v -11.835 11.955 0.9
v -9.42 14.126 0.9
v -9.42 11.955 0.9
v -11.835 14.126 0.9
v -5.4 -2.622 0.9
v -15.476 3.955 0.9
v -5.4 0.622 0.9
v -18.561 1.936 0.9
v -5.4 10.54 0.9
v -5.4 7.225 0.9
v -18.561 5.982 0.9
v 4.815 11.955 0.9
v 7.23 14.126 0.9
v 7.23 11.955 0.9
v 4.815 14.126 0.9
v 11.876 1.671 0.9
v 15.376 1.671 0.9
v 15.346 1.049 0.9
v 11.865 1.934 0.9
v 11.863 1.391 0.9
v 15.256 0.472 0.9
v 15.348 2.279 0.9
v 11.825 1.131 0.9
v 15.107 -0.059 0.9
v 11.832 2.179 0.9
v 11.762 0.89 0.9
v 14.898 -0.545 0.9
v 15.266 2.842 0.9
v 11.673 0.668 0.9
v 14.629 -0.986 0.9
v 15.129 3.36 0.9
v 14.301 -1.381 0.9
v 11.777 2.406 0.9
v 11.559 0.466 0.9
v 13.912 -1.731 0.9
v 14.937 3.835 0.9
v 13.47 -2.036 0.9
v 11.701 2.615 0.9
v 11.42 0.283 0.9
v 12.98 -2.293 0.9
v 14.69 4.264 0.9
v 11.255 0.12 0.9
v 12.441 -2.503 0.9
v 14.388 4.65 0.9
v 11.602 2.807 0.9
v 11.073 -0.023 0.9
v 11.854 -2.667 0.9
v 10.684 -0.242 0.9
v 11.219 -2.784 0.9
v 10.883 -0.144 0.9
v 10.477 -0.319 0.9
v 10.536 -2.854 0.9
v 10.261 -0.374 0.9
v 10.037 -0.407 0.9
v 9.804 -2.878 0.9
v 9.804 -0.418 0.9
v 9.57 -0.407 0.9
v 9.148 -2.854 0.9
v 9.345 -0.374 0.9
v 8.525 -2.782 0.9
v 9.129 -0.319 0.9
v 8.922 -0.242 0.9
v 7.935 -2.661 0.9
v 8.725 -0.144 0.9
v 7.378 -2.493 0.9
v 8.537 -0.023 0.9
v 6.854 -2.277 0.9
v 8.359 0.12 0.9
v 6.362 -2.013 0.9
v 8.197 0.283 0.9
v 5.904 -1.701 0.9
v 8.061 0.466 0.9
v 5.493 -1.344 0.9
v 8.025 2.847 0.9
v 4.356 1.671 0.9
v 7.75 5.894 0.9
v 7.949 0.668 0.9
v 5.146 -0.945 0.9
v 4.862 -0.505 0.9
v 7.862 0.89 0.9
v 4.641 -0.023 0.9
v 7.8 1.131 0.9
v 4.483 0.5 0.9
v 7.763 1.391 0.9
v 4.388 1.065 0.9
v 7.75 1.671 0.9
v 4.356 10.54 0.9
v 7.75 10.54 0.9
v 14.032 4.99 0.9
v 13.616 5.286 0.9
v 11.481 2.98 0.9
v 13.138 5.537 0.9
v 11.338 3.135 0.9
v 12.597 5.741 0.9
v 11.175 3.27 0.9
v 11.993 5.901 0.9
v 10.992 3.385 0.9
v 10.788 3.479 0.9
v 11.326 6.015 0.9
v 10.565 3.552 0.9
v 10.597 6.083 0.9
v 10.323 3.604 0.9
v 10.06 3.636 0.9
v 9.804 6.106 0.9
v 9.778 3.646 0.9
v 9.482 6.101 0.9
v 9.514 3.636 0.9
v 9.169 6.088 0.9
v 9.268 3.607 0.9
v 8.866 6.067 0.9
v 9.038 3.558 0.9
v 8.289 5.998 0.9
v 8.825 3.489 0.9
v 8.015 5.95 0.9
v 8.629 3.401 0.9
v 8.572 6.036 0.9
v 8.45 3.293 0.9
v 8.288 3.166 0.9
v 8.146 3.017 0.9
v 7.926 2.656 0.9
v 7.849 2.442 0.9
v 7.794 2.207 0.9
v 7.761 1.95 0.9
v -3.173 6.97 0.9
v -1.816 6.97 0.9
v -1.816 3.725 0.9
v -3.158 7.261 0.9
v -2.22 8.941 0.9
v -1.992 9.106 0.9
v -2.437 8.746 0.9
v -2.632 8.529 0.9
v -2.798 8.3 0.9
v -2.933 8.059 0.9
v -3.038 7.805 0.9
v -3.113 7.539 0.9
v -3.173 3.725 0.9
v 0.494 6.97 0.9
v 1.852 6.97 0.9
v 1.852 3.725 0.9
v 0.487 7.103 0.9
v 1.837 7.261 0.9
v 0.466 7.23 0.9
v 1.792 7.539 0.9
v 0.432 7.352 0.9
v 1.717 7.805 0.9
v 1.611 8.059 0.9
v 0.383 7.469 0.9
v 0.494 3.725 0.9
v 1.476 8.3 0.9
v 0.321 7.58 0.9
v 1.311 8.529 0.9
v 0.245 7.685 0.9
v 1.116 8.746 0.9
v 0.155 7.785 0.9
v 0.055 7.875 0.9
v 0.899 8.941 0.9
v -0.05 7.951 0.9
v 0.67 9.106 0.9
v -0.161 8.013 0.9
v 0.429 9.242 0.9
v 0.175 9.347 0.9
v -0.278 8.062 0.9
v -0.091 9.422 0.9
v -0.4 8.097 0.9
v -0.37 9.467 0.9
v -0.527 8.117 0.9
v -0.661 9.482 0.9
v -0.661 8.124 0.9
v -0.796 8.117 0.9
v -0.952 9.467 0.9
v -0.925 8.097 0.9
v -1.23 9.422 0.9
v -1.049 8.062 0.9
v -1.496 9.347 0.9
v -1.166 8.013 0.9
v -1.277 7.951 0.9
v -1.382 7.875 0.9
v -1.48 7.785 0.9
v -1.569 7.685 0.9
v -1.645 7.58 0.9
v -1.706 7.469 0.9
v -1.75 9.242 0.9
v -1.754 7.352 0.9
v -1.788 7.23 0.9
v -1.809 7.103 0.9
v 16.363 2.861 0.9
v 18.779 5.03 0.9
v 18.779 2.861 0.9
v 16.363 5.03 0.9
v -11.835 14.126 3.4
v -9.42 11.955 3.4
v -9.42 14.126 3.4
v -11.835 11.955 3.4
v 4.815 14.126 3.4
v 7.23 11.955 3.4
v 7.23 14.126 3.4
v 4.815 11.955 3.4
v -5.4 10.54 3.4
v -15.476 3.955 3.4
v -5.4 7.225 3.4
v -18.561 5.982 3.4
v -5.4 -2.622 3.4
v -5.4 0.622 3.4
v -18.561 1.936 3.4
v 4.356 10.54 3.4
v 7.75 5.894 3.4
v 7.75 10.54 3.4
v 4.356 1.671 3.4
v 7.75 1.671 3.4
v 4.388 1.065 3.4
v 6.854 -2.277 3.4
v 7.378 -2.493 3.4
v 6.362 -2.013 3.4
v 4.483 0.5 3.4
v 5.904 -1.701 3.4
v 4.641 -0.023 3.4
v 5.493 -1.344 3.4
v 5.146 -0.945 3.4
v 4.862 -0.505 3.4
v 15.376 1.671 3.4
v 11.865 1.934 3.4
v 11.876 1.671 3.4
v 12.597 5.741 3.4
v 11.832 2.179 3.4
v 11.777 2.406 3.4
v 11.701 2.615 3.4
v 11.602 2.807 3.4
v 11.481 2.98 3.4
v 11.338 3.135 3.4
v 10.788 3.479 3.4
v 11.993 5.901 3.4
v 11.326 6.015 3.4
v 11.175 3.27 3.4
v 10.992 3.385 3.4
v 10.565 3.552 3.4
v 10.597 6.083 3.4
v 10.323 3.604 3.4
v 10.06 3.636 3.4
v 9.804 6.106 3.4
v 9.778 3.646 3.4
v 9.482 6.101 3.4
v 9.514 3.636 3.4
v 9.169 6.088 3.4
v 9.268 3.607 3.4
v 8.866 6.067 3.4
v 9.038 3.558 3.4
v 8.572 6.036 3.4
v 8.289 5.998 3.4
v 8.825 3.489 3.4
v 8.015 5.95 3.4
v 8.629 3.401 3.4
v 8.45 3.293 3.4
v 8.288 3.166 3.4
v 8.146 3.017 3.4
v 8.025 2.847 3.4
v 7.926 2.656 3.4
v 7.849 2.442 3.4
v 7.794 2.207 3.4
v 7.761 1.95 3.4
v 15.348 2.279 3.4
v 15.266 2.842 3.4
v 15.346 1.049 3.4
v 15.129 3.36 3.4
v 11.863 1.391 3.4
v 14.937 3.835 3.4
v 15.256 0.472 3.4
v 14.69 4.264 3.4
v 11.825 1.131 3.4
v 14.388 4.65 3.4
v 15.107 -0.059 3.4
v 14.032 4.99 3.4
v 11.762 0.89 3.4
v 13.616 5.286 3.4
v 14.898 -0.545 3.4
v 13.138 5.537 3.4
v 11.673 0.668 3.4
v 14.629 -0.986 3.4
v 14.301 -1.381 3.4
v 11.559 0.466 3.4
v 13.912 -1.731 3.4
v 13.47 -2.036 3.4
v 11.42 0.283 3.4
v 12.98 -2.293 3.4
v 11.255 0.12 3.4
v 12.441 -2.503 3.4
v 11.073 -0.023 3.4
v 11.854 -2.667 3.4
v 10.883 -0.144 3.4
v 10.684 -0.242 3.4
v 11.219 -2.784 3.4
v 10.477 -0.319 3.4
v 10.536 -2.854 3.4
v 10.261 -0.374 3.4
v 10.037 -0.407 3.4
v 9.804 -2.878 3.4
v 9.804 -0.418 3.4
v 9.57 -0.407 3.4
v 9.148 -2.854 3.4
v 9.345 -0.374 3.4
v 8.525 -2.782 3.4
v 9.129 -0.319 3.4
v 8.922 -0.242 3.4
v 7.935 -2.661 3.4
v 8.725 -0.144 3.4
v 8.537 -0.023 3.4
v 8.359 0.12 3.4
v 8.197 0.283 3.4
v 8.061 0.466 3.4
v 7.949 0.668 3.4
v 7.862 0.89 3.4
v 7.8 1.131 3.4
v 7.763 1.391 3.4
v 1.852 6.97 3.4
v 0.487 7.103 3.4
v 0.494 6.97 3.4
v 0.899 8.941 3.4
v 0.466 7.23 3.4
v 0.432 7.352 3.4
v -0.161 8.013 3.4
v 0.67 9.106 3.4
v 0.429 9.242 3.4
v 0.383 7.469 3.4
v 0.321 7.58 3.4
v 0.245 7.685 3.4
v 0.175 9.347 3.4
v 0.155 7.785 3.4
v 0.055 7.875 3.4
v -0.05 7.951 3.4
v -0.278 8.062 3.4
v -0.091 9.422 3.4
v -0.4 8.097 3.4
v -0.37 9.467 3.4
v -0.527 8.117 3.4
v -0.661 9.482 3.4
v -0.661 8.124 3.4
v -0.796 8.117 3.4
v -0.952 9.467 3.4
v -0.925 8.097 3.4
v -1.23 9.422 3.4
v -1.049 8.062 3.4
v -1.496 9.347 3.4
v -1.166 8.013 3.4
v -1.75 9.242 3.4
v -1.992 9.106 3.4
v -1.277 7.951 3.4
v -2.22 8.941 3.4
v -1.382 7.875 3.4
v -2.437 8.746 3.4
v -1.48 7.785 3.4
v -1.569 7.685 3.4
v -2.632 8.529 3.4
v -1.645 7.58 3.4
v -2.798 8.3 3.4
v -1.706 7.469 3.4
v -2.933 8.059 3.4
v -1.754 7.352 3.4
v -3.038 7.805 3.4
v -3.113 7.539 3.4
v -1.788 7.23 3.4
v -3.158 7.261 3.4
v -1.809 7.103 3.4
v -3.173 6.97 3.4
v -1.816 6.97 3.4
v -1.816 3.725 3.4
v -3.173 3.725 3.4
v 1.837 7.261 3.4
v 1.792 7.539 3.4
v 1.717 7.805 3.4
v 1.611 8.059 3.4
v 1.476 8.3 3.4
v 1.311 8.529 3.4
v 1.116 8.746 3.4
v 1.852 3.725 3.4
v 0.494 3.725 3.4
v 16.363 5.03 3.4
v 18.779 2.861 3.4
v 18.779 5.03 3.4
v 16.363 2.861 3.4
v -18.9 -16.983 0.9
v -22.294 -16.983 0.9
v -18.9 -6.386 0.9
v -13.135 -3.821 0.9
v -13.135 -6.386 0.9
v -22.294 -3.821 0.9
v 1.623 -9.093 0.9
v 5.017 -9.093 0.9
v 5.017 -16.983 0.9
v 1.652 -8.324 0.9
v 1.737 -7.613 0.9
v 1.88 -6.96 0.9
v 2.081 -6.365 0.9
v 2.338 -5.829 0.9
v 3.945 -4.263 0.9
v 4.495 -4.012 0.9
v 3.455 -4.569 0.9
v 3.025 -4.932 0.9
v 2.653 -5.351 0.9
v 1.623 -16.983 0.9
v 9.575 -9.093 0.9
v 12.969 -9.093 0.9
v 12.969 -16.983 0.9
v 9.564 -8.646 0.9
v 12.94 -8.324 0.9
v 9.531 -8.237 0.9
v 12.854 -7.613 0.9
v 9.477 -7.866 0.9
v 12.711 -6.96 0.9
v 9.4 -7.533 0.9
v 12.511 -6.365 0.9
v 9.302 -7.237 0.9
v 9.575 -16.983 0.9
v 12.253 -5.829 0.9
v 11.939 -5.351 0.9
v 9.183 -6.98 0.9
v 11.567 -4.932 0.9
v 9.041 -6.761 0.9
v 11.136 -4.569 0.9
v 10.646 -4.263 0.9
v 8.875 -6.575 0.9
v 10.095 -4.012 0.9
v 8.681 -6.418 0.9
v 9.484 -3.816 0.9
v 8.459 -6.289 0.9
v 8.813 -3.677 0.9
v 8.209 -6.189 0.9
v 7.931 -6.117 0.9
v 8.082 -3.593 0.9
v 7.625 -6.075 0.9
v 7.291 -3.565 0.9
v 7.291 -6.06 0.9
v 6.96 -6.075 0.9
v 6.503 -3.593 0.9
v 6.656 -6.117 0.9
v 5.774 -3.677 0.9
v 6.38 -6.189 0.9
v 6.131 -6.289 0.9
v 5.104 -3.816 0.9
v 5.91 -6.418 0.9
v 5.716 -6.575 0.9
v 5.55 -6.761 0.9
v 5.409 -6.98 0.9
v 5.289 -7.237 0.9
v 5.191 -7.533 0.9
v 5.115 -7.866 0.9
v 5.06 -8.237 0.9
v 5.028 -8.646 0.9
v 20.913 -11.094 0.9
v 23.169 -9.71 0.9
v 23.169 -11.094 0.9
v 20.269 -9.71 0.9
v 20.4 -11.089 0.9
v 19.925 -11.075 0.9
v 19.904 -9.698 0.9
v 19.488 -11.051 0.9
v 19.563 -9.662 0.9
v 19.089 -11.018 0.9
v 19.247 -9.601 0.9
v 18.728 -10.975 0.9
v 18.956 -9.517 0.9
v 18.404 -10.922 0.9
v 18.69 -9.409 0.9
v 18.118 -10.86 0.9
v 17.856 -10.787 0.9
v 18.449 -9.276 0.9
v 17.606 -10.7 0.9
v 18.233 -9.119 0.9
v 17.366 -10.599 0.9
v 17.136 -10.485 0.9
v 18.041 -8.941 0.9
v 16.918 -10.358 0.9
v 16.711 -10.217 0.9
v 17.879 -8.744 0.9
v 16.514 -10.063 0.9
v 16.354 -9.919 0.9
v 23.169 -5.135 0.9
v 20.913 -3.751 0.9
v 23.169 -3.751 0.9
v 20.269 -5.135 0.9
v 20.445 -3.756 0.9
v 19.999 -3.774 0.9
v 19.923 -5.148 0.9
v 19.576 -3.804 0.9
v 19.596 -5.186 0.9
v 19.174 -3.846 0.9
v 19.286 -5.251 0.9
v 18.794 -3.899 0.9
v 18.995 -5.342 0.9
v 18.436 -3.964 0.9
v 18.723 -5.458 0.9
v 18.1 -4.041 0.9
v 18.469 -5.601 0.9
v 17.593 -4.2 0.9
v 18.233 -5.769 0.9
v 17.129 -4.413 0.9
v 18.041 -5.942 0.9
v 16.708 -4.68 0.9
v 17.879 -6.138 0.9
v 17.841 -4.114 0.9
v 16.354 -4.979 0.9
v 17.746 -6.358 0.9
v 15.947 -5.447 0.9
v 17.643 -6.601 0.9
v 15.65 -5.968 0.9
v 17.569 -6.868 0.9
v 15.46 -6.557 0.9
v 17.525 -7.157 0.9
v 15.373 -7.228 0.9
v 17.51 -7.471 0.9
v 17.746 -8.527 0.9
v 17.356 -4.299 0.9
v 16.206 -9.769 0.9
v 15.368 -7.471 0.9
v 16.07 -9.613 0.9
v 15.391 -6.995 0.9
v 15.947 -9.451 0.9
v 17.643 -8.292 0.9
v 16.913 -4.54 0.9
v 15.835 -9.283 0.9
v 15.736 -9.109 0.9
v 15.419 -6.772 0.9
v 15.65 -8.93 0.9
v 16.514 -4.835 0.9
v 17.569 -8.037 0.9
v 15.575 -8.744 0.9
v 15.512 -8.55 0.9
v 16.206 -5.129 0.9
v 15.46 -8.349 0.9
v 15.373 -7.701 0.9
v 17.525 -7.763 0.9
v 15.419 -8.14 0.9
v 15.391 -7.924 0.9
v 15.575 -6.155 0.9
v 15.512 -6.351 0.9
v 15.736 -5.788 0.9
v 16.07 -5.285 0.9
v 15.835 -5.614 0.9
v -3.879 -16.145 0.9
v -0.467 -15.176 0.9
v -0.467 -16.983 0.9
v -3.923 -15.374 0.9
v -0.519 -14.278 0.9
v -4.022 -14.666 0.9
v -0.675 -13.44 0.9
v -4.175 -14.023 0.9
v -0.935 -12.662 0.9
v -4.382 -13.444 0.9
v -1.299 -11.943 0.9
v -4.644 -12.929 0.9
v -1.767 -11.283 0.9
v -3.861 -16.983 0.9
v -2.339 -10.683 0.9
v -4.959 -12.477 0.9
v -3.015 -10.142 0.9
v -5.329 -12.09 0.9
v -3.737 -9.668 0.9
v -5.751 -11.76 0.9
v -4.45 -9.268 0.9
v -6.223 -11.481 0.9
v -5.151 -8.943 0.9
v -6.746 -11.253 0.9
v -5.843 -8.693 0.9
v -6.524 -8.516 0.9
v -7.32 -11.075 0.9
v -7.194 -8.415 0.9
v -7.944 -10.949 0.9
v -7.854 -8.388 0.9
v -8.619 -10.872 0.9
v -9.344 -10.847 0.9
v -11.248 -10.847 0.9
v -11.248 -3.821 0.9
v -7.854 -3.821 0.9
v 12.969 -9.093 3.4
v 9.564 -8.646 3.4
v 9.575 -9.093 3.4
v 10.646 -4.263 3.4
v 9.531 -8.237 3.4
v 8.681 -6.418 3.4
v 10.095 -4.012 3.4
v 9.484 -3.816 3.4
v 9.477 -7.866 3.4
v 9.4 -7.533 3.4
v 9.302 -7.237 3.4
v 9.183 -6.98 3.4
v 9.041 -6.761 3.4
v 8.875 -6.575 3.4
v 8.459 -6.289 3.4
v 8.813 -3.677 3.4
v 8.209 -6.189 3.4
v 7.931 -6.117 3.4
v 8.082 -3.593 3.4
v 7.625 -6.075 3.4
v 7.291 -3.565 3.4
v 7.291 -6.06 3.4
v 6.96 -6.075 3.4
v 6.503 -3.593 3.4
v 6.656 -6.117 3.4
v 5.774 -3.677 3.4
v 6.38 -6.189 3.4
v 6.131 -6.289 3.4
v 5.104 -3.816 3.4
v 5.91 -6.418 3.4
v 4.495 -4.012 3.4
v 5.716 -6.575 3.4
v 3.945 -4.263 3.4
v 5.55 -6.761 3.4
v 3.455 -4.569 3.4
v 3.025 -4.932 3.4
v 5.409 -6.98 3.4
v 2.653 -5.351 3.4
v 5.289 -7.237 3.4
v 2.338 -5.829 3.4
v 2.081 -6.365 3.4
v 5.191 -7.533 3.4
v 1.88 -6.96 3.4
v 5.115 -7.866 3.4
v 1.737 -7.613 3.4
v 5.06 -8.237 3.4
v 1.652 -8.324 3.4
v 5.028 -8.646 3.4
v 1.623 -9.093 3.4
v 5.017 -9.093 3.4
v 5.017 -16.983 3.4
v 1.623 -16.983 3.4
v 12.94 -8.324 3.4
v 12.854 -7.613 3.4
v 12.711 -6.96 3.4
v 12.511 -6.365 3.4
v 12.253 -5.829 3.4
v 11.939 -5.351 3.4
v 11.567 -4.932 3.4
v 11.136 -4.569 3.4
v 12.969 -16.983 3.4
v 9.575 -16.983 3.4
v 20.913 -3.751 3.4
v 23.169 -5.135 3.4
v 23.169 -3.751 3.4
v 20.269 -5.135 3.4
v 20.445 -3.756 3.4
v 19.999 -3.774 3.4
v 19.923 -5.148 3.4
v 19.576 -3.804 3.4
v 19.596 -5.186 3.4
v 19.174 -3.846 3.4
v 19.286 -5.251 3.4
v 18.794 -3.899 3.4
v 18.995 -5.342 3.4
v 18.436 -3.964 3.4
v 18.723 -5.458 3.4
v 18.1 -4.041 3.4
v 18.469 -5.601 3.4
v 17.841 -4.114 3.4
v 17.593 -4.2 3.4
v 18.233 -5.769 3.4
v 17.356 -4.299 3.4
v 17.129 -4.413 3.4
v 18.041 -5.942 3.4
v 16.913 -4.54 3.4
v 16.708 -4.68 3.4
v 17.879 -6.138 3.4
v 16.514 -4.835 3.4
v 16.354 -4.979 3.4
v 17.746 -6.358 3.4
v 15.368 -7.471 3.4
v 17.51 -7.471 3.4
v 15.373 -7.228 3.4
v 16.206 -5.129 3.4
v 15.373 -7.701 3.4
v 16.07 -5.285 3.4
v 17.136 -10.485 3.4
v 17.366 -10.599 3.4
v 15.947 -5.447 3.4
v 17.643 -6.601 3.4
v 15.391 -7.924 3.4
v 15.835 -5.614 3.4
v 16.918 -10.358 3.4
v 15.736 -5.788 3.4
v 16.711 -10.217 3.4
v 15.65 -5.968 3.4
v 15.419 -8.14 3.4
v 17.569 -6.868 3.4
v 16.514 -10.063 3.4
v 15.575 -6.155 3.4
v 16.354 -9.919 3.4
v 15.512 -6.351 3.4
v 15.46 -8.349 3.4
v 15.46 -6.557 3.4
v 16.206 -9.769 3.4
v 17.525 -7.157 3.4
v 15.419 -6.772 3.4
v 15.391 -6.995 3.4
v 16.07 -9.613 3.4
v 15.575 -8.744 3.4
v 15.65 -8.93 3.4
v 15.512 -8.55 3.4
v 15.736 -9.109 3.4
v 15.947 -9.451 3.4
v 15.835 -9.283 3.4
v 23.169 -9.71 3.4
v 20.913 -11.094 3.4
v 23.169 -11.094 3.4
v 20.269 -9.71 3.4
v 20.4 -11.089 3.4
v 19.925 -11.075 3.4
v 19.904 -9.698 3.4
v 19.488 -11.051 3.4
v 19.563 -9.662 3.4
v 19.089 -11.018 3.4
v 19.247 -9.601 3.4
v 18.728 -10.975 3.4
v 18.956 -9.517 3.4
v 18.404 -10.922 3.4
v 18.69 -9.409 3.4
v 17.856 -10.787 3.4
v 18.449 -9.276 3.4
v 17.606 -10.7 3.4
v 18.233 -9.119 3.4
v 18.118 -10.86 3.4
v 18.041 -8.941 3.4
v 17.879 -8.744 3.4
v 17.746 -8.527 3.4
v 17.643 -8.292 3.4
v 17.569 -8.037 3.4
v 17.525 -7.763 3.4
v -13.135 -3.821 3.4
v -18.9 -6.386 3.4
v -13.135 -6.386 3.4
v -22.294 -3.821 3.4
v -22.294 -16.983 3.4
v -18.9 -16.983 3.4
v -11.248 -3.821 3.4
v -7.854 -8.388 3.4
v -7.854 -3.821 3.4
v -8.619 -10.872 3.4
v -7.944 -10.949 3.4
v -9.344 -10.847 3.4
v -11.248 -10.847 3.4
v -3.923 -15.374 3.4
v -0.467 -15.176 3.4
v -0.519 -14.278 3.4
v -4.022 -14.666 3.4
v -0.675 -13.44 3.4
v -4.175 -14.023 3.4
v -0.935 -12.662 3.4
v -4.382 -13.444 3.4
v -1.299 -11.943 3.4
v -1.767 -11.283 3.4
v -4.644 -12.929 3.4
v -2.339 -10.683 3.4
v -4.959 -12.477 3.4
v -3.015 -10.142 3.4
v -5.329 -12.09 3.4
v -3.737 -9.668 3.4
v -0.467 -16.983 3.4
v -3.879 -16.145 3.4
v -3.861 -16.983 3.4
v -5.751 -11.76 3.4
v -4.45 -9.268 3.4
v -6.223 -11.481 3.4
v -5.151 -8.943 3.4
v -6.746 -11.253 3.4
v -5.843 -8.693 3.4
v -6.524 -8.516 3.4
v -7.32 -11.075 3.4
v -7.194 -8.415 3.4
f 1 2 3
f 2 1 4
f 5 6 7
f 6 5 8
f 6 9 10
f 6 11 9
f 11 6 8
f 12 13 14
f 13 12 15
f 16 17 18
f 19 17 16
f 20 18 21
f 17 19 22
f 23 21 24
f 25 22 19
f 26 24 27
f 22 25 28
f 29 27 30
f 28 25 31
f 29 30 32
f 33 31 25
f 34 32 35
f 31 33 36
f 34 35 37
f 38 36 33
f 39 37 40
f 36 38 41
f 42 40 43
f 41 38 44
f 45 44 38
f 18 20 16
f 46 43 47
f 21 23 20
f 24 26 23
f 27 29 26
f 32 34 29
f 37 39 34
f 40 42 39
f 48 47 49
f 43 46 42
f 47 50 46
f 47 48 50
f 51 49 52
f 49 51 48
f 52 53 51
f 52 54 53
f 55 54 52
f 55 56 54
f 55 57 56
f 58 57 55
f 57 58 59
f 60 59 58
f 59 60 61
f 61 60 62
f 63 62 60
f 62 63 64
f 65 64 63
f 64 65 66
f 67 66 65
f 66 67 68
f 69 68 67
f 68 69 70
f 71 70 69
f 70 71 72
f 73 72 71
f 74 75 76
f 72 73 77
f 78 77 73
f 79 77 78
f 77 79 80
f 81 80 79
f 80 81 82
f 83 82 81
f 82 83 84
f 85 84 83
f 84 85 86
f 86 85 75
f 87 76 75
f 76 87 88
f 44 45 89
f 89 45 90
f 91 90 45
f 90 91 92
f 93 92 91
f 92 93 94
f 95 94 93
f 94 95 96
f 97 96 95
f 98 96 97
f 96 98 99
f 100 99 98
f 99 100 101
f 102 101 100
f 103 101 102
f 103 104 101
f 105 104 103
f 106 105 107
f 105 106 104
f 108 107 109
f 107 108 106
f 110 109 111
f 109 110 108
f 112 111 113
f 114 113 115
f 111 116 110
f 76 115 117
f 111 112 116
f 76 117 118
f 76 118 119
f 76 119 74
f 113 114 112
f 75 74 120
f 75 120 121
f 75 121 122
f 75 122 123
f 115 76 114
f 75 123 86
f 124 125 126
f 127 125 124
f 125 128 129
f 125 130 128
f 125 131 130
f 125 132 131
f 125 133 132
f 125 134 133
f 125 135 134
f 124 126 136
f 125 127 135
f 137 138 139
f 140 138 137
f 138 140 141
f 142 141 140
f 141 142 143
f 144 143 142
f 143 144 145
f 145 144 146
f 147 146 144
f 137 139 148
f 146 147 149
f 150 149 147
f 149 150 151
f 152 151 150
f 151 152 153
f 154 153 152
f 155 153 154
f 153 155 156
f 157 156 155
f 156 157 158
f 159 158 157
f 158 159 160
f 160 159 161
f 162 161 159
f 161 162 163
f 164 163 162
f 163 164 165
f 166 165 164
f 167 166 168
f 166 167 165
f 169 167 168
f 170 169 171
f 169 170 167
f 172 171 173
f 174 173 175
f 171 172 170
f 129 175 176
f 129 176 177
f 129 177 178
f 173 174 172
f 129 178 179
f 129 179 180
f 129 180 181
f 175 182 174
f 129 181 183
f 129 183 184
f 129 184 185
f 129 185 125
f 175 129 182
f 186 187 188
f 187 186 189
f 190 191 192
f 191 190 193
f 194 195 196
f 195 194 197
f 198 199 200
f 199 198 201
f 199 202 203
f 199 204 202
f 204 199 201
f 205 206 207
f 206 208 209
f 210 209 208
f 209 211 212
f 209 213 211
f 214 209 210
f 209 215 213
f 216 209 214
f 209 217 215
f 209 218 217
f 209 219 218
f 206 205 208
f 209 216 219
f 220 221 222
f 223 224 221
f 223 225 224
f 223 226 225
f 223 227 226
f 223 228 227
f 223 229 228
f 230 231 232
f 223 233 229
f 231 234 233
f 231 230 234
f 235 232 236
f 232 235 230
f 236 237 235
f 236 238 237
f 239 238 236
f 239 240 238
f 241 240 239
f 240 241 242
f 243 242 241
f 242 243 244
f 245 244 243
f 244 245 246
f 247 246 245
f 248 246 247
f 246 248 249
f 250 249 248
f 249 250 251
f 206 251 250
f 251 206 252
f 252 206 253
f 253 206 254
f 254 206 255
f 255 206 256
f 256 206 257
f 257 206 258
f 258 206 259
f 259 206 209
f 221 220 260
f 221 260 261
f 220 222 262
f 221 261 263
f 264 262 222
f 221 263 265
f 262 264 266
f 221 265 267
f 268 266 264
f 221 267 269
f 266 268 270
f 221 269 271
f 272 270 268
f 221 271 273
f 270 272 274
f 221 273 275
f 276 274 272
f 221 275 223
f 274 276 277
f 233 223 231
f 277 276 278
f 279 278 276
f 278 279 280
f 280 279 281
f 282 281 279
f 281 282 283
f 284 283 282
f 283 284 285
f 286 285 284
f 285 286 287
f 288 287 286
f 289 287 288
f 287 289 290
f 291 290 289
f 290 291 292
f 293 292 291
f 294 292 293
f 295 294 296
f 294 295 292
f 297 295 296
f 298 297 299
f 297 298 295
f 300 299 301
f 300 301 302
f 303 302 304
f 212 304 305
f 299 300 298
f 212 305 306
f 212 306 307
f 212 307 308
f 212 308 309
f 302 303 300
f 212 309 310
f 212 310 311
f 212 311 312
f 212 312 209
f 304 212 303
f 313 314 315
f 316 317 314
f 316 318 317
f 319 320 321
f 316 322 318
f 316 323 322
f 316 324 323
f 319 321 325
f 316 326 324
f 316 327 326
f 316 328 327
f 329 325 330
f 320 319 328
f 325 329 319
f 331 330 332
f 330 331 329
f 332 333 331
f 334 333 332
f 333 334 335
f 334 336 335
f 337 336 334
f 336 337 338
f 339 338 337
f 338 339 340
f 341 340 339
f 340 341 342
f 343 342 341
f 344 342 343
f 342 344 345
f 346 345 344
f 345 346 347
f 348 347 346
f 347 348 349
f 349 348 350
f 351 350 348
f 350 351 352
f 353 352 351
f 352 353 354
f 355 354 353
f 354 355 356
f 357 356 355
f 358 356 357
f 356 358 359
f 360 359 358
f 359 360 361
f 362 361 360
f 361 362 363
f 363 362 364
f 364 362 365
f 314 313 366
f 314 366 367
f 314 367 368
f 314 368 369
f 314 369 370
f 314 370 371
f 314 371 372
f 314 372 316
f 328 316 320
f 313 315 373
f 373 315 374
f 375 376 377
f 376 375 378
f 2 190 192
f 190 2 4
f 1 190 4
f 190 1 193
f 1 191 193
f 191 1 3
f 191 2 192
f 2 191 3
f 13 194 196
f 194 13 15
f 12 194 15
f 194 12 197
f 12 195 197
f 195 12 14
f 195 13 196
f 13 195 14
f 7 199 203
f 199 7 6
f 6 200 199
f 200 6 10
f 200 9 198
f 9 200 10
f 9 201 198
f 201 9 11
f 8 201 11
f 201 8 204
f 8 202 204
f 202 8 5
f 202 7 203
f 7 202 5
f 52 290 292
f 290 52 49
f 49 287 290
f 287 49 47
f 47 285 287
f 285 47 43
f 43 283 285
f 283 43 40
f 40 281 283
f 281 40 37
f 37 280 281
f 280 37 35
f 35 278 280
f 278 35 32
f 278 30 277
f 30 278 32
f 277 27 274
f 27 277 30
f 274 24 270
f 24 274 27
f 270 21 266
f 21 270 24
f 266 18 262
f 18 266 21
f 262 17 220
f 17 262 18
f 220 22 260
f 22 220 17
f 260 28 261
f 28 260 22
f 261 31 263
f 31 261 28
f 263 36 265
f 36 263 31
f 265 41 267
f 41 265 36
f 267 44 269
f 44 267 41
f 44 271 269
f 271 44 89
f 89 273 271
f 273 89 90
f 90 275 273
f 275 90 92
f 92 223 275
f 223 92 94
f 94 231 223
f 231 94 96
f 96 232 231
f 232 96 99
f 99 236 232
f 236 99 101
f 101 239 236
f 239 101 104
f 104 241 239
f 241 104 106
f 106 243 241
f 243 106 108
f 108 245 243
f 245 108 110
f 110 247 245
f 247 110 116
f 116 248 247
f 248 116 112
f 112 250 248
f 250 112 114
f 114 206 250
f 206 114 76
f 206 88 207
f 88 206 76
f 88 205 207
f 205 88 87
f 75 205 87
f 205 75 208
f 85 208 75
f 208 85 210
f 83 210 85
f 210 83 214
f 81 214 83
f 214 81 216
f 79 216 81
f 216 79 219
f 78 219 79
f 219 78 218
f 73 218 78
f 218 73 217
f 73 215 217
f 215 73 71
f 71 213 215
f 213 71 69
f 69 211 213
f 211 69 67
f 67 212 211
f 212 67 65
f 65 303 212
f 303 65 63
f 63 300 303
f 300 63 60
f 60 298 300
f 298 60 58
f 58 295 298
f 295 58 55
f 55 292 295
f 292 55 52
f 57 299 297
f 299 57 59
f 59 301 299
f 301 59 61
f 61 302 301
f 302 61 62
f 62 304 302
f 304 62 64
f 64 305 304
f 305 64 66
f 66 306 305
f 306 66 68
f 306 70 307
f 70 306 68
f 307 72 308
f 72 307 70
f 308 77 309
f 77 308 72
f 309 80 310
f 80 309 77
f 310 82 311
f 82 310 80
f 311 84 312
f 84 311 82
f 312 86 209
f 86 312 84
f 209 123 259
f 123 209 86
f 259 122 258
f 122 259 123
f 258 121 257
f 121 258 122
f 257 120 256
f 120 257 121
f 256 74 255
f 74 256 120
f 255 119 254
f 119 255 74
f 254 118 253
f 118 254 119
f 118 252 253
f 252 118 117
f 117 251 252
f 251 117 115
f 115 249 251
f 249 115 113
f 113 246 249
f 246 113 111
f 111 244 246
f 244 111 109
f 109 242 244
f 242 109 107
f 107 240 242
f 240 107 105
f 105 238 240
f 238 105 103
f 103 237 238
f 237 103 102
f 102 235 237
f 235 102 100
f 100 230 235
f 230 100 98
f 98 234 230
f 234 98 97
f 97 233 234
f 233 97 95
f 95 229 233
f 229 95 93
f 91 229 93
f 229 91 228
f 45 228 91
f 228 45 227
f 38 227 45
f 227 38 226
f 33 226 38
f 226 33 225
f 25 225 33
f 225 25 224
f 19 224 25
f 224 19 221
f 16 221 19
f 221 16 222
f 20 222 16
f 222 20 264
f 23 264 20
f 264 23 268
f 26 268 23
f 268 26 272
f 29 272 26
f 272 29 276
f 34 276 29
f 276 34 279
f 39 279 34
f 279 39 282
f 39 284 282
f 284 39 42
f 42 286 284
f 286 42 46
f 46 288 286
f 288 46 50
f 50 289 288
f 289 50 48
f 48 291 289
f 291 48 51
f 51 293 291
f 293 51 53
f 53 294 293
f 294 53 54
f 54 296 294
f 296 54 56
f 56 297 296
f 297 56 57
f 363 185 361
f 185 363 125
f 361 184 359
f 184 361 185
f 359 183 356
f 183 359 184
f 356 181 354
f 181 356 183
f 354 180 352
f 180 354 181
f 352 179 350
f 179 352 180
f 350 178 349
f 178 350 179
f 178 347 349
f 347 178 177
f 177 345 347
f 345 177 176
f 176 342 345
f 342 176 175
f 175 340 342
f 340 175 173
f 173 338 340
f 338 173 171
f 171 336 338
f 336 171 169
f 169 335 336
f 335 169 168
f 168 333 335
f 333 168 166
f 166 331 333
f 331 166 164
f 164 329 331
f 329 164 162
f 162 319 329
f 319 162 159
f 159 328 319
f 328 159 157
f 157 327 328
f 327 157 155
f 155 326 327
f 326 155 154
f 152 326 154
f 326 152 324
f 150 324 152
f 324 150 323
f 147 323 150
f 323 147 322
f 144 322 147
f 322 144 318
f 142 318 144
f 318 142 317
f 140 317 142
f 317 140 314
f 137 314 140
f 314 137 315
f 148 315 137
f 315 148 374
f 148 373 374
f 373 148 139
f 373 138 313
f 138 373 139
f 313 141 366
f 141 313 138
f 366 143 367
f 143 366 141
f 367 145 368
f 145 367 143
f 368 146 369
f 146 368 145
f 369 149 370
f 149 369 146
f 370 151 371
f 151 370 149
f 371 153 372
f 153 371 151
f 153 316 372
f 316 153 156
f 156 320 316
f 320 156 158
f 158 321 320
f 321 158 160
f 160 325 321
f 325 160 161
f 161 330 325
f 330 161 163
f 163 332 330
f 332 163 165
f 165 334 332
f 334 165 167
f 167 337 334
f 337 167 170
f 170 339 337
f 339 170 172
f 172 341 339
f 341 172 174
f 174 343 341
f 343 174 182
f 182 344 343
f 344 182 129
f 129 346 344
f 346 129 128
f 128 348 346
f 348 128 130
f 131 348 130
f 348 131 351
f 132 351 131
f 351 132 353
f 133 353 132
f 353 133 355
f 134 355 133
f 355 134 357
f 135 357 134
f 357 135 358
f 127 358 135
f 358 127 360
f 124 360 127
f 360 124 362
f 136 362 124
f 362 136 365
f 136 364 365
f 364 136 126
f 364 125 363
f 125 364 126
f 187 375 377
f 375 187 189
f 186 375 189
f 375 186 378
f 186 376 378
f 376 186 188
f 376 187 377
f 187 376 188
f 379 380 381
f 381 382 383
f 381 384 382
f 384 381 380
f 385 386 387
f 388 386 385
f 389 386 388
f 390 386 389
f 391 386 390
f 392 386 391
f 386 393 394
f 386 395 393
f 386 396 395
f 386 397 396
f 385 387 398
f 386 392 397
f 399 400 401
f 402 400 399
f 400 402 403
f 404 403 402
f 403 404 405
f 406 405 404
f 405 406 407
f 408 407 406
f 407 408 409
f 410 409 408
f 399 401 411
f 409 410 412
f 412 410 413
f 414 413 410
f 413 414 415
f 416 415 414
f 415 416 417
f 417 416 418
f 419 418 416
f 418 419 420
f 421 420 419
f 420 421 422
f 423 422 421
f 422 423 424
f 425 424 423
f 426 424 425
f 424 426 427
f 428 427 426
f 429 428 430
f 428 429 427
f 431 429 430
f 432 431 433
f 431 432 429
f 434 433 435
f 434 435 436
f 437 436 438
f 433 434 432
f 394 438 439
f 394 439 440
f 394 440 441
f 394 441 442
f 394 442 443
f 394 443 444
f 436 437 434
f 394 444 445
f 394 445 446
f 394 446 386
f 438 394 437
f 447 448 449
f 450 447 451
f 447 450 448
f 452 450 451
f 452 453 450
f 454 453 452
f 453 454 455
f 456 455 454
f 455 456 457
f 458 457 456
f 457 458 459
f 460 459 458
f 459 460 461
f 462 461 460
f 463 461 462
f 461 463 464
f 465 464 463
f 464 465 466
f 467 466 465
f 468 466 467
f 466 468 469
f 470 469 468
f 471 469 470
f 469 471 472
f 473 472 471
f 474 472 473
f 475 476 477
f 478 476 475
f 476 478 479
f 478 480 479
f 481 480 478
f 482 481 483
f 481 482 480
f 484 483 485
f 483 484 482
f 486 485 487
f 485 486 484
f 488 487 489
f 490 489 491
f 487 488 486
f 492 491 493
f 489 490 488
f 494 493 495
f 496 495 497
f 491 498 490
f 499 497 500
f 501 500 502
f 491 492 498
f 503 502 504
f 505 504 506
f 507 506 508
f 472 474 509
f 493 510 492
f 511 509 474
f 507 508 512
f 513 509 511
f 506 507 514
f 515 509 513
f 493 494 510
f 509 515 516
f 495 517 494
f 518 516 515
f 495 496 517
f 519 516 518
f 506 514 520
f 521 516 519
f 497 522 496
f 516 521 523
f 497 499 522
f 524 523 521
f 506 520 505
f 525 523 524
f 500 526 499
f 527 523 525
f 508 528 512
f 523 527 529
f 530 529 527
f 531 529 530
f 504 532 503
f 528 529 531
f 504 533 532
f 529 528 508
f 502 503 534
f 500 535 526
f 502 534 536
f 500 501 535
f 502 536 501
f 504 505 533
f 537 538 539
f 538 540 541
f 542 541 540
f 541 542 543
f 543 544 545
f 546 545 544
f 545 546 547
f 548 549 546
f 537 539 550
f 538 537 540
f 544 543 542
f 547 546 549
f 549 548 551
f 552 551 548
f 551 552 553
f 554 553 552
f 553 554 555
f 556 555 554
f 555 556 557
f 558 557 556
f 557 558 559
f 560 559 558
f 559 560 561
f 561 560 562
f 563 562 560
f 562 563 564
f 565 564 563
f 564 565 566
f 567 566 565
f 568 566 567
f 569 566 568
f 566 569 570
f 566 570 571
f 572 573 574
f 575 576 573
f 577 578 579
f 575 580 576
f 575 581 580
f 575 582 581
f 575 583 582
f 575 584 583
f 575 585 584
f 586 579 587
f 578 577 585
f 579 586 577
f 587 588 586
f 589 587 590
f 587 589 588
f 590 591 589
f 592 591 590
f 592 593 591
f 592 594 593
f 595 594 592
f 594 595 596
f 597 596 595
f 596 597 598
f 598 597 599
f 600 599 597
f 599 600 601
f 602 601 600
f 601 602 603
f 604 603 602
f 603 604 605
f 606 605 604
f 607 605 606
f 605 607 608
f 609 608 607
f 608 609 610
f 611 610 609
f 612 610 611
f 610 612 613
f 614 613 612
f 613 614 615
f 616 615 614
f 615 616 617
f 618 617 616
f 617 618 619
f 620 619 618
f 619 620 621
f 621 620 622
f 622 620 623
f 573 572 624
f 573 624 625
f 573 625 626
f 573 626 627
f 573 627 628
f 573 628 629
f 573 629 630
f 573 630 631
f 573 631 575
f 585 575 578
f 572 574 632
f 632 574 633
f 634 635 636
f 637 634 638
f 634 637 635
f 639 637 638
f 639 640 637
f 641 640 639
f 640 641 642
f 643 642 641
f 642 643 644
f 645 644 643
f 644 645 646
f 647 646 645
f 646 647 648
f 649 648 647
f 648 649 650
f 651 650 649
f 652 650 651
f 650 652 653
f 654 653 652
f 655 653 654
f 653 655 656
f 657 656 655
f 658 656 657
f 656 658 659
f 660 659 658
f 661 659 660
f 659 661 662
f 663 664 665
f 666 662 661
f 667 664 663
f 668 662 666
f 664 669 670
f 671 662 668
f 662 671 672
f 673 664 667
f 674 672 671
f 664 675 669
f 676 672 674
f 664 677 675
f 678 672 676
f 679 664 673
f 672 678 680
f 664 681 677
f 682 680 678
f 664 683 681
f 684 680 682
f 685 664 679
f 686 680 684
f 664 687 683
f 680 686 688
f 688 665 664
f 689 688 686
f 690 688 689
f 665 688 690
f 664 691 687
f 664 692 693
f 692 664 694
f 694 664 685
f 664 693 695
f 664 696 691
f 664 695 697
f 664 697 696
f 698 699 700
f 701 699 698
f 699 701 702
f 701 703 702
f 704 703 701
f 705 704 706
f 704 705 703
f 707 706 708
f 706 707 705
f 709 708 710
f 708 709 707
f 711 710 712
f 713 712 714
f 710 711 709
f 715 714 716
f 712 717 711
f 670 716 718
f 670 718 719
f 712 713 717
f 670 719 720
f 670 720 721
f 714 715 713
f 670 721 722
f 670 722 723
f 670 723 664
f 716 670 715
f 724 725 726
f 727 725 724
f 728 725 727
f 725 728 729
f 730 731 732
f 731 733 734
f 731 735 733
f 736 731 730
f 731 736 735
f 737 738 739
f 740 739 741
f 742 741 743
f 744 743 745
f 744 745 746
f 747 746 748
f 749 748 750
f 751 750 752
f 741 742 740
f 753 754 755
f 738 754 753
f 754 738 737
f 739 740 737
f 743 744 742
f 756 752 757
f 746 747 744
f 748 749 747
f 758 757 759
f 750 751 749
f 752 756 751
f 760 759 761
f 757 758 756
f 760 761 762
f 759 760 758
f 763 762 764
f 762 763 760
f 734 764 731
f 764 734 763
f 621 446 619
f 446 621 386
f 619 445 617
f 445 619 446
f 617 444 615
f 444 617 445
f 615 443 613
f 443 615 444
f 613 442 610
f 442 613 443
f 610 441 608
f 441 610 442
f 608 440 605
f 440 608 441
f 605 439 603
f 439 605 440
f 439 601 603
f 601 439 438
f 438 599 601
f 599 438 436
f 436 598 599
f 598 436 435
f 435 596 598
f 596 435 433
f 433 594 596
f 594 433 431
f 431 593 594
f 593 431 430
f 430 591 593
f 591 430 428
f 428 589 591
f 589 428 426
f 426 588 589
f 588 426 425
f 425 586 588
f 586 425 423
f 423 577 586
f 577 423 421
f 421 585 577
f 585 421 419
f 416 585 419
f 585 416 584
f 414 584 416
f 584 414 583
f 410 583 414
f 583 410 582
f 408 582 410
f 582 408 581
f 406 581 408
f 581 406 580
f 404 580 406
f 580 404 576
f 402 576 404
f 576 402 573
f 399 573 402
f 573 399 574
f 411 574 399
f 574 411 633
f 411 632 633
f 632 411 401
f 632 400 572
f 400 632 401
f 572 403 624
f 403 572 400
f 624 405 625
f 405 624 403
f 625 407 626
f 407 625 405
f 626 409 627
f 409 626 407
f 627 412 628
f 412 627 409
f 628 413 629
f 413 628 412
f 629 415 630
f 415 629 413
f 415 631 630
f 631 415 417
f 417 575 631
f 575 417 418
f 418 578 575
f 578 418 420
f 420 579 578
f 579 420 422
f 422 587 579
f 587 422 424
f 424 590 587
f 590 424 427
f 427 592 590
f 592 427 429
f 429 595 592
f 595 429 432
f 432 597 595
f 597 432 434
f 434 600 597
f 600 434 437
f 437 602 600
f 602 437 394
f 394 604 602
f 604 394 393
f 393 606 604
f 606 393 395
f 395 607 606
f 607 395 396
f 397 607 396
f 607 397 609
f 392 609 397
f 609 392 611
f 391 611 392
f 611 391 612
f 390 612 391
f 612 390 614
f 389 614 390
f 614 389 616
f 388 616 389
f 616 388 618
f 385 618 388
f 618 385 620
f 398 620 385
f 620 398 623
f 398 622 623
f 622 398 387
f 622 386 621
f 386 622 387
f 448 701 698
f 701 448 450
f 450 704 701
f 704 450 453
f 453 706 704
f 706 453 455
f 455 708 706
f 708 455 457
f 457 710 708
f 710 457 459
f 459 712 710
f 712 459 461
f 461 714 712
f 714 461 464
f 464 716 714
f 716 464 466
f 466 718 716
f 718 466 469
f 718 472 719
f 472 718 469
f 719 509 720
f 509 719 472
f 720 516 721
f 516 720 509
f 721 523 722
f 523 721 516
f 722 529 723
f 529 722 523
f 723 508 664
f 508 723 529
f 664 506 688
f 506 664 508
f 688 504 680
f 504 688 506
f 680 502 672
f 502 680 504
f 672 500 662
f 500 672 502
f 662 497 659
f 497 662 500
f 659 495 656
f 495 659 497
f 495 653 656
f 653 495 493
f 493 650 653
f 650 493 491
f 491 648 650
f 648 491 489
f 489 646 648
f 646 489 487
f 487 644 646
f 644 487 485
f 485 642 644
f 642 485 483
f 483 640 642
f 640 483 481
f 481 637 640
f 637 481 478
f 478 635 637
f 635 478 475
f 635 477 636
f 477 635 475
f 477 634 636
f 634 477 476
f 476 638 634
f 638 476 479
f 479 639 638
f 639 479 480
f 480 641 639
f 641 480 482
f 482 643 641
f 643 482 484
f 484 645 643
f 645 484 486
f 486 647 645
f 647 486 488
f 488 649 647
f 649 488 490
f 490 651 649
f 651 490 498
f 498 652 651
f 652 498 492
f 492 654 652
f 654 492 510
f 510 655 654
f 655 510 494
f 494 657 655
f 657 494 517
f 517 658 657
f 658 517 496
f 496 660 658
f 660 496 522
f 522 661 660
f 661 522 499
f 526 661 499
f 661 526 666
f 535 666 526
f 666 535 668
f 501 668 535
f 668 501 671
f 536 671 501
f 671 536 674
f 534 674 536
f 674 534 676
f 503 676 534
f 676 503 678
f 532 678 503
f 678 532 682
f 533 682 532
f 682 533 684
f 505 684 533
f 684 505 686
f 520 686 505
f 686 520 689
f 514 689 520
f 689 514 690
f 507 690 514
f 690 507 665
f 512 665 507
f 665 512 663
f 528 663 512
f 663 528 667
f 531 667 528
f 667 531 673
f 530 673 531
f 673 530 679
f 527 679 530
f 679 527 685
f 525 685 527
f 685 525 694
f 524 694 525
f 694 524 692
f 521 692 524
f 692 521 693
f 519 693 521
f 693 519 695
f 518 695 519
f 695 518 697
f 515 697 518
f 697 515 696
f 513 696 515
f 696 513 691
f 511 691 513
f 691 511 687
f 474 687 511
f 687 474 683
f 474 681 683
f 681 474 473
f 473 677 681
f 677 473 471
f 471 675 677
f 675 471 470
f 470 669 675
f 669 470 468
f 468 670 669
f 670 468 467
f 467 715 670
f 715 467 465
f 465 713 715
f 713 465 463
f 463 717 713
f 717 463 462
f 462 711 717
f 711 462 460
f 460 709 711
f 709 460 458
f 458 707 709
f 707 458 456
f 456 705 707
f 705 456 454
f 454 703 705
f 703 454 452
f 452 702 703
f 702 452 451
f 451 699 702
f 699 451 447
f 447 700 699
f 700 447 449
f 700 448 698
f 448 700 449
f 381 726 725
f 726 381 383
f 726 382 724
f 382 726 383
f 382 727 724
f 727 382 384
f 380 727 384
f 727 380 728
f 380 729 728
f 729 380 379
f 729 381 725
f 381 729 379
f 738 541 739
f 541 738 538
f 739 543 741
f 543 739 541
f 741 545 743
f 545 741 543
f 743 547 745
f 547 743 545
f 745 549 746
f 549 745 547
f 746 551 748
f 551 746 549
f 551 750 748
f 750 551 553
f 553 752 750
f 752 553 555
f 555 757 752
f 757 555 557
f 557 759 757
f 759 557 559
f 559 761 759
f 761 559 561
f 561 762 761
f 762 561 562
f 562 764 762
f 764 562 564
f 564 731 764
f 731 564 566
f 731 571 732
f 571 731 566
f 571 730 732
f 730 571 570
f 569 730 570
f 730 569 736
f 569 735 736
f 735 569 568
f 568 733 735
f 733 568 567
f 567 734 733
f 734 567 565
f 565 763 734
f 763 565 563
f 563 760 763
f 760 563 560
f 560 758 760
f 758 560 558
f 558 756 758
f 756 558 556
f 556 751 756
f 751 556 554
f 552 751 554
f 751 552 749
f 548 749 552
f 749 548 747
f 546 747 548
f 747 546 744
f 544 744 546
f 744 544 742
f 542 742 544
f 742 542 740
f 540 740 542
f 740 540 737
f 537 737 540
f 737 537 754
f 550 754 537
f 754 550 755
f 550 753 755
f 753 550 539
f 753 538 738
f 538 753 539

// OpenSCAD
$fn = 48;
  // syllabics (overlaid on icon, tallest)
  translate([0, 5.430, 0.900]) linear_extrude(height=2.500) text("ᐹᐢᒁ", size=13.000, halign="center", valign="center", font="Euphemia UCAS:style=Bold");
  translate([0, -10.430, 0.900]) linear_extrude(height=2.500) text("ᒥᓴᑎᒼ", size=13.000, halign="center", valign="center", font="Euphemia UCAS:style=Bold");
